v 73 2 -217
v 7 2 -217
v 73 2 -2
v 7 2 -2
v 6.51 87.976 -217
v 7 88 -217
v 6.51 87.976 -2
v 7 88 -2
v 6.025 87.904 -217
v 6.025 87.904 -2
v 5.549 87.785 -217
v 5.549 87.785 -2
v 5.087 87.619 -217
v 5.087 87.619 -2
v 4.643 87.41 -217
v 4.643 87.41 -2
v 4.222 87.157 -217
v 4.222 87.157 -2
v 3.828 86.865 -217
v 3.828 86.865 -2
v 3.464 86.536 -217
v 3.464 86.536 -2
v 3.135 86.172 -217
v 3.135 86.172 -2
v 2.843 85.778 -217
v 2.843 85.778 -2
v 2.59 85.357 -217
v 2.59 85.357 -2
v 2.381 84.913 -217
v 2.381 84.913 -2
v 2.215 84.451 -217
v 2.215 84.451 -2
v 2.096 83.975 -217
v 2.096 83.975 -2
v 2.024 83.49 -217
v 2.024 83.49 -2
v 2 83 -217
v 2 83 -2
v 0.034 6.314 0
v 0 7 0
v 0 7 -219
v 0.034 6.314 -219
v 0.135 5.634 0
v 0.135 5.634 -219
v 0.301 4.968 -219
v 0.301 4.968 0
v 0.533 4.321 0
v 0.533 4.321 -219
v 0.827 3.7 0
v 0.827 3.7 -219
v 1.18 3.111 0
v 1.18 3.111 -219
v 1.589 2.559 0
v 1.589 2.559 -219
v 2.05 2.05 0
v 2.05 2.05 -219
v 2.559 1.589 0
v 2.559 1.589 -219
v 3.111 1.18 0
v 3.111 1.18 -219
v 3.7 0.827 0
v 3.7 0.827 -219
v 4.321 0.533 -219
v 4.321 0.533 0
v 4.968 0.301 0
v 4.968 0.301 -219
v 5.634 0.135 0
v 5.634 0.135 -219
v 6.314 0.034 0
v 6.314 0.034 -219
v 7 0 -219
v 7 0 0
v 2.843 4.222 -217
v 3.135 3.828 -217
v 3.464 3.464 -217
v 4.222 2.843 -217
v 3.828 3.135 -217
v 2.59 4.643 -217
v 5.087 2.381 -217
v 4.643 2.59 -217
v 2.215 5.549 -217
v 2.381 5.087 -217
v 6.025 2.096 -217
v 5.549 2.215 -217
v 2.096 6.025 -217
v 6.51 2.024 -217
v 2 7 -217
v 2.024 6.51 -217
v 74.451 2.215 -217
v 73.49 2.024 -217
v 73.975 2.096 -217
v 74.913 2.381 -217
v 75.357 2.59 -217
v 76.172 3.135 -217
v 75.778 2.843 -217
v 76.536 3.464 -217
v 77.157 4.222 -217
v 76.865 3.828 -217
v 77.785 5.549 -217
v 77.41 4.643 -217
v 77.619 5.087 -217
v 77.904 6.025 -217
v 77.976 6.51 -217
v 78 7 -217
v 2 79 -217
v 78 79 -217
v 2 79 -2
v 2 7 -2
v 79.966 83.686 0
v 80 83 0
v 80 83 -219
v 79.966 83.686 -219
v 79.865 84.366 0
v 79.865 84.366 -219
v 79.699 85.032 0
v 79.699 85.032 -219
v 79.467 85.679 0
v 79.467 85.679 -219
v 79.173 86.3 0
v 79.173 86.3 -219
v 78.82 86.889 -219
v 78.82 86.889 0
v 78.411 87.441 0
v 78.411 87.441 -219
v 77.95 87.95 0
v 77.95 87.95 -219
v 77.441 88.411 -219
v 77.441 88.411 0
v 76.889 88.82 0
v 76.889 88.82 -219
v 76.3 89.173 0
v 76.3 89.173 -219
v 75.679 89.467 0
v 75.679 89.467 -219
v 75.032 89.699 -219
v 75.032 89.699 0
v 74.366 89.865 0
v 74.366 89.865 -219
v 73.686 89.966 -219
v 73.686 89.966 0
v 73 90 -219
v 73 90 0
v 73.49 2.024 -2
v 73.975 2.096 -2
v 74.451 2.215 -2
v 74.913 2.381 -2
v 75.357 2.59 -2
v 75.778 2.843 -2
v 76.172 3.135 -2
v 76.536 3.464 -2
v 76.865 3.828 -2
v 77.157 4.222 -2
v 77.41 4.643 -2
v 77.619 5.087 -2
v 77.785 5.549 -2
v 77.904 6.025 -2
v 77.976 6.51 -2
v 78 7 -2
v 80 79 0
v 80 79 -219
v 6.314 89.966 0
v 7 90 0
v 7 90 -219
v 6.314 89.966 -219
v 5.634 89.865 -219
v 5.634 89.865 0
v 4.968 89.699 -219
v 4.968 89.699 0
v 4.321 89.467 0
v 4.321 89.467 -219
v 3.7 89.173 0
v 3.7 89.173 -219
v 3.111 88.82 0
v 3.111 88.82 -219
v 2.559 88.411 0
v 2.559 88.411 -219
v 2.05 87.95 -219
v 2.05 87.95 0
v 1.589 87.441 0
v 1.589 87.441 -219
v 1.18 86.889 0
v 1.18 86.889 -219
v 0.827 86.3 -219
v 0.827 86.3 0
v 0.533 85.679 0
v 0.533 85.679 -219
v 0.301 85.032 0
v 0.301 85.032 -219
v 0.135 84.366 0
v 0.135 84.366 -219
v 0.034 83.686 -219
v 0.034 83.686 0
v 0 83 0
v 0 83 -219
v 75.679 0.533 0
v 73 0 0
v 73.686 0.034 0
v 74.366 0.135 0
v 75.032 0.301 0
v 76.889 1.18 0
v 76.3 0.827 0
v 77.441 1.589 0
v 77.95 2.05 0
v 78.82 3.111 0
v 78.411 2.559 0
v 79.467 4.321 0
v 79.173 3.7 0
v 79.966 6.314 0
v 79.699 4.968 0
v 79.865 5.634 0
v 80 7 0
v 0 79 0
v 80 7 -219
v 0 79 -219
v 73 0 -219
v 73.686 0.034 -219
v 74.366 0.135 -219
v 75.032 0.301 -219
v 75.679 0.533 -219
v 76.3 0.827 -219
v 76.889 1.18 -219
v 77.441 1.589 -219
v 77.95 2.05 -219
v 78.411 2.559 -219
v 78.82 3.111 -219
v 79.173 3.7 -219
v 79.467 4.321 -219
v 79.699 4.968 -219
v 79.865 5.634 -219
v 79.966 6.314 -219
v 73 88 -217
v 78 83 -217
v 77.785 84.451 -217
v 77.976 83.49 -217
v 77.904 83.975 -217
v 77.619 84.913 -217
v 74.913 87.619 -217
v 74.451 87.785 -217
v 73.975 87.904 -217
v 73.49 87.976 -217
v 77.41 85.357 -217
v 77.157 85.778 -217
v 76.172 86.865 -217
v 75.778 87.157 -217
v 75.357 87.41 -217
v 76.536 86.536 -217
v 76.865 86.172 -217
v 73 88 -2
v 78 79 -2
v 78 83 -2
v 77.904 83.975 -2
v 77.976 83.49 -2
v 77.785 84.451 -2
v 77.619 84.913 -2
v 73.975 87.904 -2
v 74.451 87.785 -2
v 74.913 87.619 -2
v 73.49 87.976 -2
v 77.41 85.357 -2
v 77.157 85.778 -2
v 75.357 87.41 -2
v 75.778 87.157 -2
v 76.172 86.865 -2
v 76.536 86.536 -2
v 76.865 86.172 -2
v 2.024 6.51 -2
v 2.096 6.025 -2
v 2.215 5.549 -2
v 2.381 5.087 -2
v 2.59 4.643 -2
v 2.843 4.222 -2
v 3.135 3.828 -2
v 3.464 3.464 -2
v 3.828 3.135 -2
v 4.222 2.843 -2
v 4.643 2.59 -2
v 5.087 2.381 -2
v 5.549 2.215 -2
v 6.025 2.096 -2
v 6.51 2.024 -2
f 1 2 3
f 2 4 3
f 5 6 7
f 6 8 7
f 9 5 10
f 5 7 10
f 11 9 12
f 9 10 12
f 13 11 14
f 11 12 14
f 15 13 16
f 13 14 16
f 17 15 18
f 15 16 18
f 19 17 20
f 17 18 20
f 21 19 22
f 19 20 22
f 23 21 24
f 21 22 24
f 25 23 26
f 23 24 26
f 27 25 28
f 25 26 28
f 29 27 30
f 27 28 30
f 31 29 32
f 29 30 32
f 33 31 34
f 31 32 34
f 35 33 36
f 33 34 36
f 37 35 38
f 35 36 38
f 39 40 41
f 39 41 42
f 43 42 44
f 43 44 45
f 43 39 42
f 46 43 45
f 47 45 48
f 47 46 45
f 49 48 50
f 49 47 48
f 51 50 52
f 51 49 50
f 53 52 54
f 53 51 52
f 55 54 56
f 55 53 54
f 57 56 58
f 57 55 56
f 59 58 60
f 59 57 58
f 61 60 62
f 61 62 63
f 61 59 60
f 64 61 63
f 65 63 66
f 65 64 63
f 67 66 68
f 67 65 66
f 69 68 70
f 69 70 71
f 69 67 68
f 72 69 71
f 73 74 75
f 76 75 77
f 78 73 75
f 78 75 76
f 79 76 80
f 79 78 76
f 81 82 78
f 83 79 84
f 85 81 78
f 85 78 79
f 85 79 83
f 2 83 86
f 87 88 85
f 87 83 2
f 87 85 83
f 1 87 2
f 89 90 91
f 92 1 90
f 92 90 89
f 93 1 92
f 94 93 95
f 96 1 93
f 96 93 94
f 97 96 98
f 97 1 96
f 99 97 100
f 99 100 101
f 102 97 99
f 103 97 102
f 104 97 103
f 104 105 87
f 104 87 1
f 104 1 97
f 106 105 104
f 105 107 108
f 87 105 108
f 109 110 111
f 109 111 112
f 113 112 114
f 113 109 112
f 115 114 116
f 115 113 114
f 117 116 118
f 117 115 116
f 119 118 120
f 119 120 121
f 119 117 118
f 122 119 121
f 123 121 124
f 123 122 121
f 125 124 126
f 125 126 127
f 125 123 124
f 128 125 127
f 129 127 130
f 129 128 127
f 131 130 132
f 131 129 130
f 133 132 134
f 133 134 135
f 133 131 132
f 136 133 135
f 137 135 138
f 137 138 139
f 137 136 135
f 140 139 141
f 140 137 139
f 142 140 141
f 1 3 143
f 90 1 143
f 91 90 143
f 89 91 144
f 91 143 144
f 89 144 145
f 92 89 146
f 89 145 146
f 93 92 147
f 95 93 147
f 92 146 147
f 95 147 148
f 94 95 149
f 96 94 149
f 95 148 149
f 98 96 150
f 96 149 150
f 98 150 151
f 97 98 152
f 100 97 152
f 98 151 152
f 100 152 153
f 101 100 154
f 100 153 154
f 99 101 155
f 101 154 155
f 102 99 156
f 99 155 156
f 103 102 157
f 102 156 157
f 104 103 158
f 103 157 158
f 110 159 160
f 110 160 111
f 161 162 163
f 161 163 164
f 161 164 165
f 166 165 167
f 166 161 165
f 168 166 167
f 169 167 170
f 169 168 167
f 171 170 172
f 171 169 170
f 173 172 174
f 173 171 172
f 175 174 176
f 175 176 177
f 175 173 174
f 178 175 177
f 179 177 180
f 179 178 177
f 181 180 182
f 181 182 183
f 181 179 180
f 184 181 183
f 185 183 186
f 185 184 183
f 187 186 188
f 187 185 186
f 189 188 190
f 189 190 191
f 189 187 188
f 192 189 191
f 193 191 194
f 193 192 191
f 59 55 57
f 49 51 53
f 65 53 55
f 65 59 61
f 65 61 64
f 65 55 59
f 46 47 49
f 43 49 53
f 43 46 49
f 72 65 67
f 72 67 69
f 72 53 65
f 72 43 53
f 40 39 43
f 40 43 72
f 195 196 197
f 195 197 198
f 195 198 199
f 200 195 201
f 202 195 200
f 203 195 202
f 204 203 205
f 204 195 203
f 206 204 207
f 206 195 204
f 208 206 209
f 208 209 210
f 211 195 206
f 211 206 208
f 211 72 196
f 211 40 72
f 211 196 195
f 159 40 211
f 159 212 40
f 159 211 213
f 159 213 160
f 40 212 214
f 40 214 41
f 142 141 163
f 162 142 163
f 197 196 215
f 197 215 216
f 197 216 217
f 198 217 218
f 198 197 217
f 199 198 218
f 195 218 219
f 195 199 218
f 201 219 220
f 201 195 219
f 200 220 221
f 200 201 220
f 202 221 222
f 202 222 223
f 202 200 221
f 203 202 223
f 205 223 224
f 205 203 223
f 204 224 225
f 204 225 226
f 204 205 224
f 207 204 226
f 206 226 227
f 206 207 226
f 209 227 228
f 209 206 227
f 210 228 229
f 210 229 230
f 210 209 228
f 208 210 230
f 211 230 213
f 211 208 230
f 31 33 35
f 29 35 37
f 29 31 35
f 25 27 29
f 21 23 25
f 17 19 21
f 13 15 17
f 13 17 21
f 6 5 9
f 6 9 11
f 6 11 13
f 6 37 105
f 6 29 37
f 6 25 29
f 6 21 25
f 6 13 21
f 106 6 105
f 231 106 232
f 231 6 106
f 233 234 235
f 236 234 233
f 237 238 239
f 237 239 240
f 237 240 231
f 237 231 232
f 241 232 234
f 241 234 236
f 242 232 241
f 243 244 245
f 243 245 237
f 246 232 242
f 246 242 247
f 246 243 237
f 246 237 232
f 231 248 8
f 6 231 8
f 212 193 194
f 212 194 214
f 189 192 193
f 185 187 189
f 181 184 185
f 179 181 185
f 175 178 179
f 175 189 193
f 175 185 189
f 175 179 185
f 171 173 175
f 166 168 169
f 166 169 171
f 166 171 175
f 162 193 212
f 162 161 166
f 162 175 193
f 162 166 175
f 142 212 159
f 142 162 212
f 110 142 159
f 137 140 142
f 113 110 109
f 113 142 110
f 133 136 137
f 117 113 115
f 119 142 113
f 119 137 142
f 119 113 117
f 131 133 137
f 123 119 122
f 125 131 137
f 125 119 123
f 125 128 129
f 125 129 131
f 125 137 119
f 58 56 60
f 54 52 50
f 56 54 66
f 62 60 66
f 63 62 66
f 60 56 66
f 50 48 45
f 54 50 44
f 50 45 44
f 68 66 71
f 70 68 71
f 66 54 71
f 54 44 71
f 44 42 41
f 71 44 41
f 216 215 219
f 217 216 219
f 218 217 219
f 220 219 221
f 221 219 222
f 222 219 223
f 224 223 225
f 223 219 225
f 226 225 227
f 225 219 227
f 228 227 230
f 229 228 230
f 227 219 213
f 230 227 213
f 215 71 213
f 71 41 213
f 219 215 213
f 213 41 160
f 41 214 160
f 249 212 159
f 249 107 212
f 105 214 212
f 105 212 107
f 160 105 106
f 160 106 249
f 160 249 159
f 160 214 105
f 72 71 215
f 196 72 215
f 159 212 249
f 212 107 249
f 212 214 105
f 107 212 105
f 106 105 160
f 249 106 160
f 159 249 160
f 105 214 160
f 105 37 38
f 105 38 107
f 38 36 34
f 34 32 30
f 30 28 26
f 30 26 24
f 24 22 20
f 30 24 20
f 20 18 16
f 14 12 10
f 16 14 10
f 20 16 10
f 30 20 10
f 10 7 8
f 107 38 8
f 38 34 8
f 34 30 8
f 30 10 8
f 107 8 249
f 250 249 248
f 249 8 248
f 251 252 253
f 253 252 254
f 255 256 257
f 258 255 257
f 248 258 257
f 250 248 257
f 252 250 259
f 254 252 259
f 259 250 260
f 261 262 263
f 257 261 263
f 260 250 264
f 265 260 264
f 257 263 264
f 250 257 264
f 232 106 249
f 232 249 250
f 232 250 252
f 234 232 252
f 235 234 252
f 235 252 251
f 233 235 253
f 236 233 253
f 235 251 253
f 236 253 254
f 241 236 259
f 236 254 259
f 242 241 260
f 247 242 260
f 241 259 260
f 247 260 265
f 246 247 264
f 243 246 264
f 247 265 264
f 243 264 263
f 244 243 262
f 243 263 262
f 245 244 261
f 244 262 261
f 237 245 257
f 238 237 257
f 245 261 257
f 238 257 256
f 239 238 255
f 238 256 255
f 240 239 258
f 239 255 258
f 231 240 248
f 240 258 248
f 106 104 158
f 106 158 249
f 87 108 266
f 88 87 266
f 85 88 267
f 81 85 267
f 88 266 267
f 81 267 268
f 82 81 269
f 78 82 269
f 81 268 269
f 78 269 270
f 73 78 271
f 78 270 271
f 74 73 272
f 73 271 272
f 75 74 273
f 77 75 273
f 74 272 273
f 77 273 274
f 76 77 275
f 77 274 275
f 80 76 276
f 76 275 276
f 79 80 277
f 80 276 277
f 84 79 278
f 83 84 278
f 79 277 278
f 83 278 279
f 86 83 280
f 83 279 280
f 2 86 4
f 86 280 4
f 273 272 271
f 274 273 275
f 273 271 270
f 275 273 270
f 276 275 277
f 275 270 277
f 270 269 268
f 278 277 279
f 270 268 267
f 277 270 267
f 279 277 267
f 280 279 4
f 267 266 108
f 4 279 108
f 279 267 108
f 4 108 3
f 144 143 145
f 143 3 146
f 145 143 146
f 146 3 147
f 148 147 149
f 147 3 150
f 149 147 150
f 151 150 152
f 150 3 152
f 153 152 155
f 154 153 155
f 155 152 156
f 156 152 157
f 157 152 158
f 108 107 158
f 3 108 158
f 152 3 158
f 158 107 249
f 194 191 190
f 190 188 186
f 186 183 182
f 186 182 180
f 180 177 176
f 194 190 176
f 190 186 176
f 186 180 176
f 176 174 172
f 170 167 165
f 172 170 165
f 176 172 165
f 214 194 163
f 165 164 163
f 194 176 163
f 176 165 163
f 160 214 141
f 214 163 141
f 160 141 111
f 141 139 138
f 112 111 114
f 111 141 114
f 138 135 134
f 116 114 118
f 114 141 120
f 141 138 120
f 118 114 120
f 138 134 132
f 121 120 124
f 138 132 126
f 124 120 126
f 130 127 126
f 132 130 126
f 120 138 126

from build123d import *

# Parameters (mm, degrees)
BOSS_EXTRUDE1_DEPTH    = 219
SHELL1_T               = 2
SPLIT1_SURFACE_1_BACK  = 250.922
SPLIT1_SURFACE_1_DEPTH = 501.844
SPLIT1_SURFACE_2_BACK  = 250.922
SPLIT1_SURFACE_2_DEPTH = 501.844


with BuildPart() as part:
    # Sketch2 → Boss-Extrude1 (new body)
    with BuildSketch(Plane.XY):
        with BuildLine():
            Line((7, 0), (73, 0))
            ThreePointArc((73, 0), (77.949747468, 2.050252532), (80, 7))
            Line((80, 7), (80, 83))
            ThreePointArc((80, 83), (77.949747468, 87.949747468), (73, 90))
            Line((73, 90), (7, 90))
            ThreePointArc((7, 90), (2.050252532, 87.949747468), (0, 83))
            Line((0, 83), (0, 7))
            ThreePointArc((0, 7), (2.050252532, 2.050252532), (7, 0))
        make_face()
    extrude(amount=-BOSS_EXTRUDE1_DEPTH)

    # Shell1 (no face opened: a closed hollow body)
    add(offset(amount=-SHELL1_T, mode=Mode.PRIVATE), mode=Mode.SUBTRACT)


with BuildPart() as body_2:
    # Split1: the piece behind the surface
    add(part.part)
    # Split1 surface: a surface, the sketch's curves swept straight by 501.844 mm
    with BuildLine(Plane.XY.offset(-SPLIT1_SURFACE_1_BACK), mode=Mode.PRIVATE) as split1_surface_1_path:
        Line((0, 79), (80, 79))
    split1_surface_1 = Shell.extrude(split1_surface_1_path.wire(), (0 * SPLIT1_SURFACE_1_DEPTH, 0 * SPLIT1_SURFACE_1_DEPTH, 1 * SPLIT1_SURFACE_1_DEPTH))
    split(bisect_by=split1_surface_1, keep=Keep.BOTTOM)


with BuildPart() as part_1:
    add(part.part)

    # Split1: split by a surface, the side it looks to stays
    # Split1 surface: a surface, the sketch's curves swept straight by 501.844 mm
    with BuildLine(Plane.XY.offset(-SPLIT1_SURFACE_2_BACK), mode=Mode.PRIVATE) as split1_surface_2_path:
        Line((0, 79), (80, 79))
    split1_surface_2 = Shell.extrude(split1_surface_2_path.wire(), (0 * SPLIT1_SURFACE_2_DEPTH, 0 * SPLIT1_SURFACE_2_DEPTH, 1 * SPLIT1_SURFACE_2_DEPTH))
    split(bisect_by=split1_surface_2, keep=Keep.TOP)


solid = Compound([body_2.part, part_1.part])
